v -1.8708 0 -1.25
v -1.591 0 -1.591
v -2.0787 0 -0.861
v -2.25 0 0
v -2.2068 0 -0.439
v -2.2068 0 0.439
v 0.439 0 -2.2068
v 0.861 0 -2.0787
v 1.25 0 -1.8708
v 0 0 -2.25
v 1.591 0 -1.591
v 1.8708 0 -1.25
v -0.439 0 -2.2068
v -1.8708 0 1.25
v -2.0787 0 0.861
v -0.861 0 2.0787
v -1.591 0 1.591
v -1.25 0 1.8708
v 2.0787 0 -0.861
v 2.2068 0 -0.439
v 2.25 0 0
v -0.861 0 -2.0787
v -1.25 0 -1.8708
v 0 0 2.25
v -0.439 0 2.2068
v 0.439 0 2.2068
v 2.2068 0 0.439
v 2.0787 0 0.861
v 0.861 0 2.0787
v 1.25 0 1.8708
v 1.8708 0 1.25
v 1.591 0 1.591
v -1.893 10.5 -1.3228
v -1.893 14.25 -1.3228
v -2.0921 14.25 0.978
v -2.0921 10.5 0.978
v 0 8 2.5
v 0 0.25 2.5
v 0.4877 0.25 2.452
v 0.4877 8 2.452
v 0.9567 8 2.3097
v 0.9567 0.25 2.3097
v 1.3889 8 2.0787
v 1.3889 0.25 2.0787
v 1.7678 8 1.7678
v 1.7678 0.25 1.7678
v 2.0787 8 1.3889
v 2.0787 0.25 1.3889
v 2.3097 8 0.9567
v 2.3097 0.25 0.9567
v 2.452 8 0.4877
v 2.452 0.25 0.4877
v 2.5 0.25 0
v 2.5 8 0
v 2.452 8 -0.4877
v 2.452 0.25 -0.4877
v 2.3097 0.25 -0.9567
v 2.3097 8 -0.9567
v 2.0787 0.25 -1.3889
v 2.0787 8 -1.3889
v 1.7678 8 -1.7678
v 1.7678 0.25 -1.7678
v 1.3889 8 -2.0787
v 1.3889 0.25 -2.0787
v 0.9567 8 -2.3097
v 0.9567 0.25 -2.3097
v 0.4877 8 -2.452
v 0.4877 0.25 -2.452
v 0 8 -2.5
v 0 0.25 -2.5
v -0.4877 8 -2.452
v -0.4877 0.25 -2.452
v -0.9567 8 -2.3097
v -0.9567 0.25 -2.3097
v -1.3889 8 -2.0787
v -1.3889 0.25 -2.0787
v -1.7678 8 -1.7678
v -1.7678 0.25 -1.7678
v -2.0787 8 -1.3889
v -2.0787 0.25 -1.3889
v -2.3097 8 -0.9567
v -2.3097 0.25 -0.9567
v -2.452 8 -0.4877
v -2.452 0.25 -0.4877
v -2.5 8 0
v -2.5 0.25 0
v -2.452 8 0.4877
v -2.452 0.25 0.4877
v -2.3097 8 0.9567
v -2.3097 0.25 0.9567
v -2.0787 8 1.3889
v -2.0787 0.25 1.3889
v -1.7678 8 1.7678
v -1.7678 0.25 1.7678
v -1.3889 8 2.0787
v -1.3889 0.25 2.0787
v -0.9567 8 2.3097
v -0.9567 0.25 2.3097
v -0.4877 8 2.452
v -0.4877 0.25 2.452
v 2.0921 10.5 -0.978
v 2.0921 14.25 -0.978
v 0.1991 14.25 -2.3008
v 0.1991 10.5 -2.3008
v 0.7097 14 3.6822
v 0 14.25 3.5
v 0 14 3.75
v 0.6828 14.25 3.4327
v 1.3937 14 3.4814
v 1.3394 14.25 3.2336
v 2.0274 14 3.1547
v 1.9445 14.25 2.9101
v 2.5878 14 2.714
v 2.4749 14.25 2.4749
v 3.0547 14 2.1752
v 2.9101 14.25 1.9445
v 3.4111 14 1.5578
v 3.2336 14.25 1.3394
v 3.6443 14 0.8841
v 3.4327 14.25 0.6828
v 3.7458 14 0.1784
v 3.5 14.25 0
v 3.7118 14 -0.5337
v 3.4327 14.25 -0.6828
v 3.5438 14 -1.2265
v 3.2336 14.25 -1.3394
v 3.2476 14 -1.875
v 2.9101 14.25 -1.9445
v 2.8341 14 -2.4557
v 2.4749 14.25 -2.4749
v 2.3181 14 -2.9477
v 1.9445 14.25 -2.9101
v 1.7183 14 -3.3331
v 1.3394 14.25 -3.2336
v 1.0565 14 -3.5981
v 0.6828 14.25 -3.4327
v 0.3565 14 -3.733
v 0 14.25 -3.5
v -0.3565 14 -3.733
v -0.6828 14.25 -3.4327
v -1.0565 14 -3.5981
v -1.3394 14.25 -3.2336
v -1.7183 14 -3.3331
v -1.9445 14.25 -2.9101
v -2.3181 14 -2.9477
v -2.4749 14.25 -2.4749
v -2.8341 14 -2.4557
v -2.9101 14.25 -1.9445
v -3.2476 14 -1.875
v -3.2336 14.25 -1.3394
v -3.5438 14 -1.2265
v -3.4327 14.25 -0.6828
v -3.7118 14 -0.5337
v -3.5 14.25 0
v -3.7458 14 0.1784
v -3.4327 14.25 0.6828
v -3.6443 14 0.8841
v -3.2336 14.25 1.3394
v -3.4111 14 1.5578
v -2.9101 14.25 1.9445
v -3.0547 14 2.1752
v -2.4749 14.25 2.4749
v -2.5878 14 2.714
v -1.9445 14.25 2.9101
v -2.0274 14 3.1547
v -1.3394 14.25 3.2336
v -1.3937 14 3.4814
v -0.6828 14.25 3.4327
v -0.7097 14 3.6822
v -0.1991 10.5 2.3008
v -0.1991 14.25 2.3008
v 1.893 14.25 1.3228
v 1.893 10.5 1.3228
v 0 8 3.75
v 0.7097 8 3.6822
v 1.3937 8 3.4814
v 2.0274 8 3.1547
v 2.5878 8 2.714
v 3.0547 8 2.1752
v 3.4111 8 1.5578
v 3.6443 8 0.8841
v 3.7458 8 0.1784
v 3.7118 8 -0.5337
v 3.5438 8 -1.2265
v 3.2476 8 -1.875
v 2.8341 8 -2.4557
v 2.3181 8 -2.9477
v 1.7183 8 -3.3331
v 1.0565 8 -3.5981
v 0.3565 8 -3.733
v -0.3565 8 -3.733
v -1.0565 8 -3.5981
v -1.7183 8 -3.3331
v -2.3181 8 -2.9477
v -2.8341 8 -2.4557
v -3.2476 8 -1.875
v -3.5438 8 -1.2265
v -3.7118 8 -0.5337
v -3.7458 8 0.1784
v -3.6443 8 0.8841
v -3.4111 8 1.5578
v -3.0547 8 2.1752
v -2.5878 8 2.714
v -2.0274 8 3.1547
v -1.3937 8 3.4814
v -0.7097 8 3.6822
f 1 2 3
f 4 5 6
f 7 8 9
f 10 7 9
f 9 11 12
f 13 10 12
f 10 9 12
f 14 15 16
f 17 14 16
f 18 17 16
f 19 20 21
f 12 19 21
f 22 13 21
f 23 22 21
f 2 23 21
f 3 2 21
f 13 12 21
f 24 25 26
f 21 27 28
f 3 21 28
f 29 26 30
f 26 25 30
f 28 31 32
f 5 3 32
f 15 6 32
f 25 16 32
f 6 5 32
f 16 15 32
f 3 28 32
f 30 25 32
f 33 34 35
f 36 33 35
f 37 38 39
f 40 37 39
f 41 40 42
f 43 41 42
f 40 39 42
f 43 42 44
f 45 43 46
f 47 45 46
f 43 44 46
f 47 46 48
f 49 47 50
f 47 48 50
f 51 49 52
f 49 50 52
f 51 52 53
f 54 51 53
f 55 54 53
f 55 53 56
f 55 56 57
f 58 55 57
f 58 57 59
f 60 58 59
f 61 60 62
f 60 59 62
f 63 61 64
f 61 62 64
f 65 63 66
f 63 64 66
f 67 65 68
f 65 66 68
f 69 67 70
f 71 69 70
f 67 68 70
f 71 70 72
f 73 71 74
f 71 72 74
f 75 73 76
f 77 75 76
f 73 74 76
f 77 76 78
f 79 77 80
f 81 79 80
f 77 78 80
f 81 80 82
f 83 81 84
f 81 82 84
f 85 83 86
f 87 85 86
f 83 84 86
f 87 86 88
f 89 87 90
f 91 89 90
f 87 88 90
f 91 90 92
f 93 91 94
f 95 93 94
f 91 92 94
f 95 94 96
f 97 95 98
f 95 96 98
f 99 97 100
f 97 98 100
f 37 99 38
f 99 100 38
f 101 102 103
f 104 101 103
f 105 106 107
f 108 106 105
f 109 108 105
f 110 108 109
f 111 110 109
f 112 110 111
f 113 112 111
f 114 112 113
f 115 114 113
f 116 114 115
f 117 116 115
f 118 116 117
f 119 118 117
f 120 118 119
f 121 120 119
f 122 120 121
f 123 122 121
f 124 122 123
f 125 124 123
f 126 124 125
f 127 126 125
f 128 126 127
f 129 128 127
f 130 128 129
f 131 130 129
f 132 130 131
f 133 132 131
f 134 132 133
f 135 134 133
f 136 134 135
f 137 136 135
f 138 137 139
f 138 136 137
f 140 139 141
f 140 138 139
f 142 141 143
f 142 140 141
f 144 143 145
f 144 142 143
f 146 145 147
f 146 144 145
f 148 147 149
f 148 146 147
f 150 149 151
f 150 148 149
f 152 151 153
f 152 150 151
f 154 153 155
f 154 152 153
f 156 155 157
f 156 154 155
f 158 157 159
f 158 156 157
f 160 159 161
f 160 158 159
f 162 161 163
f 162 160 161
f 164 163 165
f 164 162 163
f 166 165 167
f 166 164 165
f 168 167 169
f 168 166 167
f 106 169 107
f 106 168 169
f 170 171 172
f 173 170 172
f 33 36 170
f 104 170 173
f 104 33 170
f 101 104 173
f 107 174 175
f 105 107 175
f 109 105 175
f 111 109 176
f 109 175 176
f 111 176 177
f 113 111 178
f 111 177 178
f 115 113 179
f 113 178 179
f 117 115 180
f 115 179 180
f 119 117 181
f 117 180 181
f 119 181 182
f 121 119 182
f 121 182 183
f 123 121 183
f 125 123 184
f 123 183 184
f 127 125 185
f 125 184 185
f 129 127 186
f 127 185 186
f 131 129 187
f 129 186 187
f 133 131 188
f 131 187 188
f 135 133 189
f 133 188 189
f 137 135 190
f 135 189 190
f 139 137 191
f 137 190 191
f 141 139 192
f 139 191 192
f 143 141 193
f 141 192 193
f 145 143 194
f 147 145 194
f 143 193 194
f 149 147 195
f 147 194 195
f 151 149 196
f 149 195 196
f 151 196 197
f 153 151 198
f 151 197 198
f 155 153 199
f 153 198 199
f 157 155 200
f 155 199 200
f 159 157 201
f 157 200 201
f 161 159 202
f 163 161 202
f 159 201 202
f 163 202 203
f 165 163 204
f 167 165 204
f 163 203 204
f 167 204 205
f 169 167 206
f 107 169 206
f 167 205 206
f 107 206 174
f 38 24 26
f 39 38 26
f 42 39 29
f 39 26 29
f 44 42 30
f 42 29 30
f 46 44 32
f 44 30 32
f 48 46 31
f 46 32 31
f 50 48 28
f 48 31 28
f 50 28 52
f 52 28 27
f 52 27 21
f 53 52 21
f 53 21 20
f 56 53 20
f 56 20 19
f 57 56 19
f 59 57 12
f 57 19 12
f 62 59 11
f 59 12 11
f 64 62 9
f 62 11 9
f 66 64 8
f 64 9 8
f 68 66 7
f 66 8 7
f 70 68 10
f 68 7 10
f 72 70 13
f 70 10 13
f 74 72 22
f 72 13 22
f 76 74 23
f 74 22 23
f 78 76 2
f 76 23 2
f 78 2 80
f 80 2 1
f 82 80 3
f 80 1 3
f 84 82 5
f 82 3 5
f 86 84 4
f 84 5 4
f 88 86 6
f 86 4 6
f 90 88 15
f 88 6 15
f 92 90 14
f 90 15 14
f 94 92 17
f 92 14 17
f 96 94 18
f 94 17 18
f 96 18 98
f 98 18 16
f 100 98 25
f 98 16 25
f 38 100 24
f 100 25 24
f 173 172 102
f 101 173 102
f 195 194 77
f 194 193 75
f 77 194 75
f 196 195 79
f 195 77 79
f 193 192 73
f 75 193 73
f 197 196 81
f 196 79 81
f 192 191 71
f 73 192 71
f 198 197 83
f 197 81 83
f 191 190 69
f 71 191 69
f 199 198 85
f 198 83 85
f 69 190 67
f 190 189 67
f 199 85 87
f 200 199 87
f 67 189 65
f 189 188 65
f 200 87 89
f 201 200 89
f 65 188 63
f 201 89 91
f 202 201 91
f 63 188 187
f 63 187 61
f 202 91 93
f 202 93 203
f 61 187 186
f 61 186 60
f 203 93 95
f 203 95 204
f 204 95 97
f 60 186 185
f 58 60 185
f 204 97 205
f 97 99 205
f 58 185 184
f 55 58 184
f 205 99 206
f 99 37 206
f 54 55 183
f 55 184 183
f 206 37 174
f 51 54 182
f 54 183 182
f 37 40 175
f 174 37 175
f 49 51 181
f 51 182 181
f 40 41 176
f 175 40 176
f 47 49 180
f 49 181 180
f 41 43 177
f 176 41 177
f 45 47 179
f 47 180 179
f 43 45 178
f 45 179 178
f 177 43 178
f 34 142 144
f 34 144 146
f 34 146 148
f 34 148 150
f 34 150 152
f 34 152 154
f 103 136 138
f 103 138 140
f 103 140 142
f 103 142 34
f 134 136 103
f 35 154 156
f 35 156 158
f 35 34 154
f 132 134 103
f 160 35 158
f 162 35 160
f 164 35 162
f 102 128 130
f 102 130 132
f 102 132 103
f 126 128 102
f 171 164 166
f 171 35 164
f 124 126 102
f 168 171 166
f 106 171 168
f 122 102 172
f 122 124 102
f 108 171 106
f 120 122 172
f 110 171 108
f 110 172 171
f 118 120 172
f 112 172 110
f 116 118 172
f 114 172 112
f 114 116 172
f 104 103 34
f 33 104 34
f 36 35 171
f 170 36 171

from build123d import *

# Parameters (mm, degrees)
SKICA1_R                 = 2.5
P_IDAT_VYSUNUT_M1_DEPTH  = 8
SKICA2_R                 = 3.75
P_IDAT_VYSUNUT_M2_DEPTH  = 6.25
ODEBRAT_VYSUNUT_M1_DEPTH = 3.75
ZKOSEN_1_SIZE            = 0.25


with BuildPart() as part:
    # Skica1 → Přidat vysunutím1 (new body)
    with BuildSketch(Plane(origin=(0, 0, 0), x_dir=(1, 0, 0), z_dir=(0, 1, 0))):
        with Locations(Location((0, 0, 0), (0, 0, 270))):
            Circle(SKICA1_R)
    extrude(amount=P_IDAT_VYSUNUT_M1_DEPTH)

    # Skica2 → Přidat vysunutím2 (add)
    with BuildSketch(Plane(origin=(0, 8, 0), x_dir=(1, 0, 0), z_dir=(0, 1, 0))):
        with Locations(Location((0, 0, 0), (0, 0, 270))):
            Circle(SKICA2_R)
    extrude(amount=P_IDAT_VYSUNUT_M2_DEPTH)

    # Skica3 → Odebrat vysunutím1 (cut)
    with BuildSketch(Plane(origin=(0, 14.25, 0), x_dir=(1, 0, 0), z_dir=(0, 1, 0))):
        Polygon((-0.199101745, -2.300802431), (1.893002482, -1.322828385), (2.092104227, 0.977974047), (0.199101745, 2.300802431), (-1.893002482, 1.322828385), (-2.092104227, -0.977974047), align=None)
    extrude(amount=-ODEBRAT_VYSUNUT_M1_DEPTH, mode=Mode.SUBTRACT)

    # Zkosení1
    zkosen_1_edges = [part.edges().sort_by_distance(p)[0] for p in [
        (0, 0, -2.5),
        (0, 14.25, -3.75),
    ]]
    chamfer(zkosen_1_edges, length=ZKOSEN_1_SIZE)


solid = part.part
